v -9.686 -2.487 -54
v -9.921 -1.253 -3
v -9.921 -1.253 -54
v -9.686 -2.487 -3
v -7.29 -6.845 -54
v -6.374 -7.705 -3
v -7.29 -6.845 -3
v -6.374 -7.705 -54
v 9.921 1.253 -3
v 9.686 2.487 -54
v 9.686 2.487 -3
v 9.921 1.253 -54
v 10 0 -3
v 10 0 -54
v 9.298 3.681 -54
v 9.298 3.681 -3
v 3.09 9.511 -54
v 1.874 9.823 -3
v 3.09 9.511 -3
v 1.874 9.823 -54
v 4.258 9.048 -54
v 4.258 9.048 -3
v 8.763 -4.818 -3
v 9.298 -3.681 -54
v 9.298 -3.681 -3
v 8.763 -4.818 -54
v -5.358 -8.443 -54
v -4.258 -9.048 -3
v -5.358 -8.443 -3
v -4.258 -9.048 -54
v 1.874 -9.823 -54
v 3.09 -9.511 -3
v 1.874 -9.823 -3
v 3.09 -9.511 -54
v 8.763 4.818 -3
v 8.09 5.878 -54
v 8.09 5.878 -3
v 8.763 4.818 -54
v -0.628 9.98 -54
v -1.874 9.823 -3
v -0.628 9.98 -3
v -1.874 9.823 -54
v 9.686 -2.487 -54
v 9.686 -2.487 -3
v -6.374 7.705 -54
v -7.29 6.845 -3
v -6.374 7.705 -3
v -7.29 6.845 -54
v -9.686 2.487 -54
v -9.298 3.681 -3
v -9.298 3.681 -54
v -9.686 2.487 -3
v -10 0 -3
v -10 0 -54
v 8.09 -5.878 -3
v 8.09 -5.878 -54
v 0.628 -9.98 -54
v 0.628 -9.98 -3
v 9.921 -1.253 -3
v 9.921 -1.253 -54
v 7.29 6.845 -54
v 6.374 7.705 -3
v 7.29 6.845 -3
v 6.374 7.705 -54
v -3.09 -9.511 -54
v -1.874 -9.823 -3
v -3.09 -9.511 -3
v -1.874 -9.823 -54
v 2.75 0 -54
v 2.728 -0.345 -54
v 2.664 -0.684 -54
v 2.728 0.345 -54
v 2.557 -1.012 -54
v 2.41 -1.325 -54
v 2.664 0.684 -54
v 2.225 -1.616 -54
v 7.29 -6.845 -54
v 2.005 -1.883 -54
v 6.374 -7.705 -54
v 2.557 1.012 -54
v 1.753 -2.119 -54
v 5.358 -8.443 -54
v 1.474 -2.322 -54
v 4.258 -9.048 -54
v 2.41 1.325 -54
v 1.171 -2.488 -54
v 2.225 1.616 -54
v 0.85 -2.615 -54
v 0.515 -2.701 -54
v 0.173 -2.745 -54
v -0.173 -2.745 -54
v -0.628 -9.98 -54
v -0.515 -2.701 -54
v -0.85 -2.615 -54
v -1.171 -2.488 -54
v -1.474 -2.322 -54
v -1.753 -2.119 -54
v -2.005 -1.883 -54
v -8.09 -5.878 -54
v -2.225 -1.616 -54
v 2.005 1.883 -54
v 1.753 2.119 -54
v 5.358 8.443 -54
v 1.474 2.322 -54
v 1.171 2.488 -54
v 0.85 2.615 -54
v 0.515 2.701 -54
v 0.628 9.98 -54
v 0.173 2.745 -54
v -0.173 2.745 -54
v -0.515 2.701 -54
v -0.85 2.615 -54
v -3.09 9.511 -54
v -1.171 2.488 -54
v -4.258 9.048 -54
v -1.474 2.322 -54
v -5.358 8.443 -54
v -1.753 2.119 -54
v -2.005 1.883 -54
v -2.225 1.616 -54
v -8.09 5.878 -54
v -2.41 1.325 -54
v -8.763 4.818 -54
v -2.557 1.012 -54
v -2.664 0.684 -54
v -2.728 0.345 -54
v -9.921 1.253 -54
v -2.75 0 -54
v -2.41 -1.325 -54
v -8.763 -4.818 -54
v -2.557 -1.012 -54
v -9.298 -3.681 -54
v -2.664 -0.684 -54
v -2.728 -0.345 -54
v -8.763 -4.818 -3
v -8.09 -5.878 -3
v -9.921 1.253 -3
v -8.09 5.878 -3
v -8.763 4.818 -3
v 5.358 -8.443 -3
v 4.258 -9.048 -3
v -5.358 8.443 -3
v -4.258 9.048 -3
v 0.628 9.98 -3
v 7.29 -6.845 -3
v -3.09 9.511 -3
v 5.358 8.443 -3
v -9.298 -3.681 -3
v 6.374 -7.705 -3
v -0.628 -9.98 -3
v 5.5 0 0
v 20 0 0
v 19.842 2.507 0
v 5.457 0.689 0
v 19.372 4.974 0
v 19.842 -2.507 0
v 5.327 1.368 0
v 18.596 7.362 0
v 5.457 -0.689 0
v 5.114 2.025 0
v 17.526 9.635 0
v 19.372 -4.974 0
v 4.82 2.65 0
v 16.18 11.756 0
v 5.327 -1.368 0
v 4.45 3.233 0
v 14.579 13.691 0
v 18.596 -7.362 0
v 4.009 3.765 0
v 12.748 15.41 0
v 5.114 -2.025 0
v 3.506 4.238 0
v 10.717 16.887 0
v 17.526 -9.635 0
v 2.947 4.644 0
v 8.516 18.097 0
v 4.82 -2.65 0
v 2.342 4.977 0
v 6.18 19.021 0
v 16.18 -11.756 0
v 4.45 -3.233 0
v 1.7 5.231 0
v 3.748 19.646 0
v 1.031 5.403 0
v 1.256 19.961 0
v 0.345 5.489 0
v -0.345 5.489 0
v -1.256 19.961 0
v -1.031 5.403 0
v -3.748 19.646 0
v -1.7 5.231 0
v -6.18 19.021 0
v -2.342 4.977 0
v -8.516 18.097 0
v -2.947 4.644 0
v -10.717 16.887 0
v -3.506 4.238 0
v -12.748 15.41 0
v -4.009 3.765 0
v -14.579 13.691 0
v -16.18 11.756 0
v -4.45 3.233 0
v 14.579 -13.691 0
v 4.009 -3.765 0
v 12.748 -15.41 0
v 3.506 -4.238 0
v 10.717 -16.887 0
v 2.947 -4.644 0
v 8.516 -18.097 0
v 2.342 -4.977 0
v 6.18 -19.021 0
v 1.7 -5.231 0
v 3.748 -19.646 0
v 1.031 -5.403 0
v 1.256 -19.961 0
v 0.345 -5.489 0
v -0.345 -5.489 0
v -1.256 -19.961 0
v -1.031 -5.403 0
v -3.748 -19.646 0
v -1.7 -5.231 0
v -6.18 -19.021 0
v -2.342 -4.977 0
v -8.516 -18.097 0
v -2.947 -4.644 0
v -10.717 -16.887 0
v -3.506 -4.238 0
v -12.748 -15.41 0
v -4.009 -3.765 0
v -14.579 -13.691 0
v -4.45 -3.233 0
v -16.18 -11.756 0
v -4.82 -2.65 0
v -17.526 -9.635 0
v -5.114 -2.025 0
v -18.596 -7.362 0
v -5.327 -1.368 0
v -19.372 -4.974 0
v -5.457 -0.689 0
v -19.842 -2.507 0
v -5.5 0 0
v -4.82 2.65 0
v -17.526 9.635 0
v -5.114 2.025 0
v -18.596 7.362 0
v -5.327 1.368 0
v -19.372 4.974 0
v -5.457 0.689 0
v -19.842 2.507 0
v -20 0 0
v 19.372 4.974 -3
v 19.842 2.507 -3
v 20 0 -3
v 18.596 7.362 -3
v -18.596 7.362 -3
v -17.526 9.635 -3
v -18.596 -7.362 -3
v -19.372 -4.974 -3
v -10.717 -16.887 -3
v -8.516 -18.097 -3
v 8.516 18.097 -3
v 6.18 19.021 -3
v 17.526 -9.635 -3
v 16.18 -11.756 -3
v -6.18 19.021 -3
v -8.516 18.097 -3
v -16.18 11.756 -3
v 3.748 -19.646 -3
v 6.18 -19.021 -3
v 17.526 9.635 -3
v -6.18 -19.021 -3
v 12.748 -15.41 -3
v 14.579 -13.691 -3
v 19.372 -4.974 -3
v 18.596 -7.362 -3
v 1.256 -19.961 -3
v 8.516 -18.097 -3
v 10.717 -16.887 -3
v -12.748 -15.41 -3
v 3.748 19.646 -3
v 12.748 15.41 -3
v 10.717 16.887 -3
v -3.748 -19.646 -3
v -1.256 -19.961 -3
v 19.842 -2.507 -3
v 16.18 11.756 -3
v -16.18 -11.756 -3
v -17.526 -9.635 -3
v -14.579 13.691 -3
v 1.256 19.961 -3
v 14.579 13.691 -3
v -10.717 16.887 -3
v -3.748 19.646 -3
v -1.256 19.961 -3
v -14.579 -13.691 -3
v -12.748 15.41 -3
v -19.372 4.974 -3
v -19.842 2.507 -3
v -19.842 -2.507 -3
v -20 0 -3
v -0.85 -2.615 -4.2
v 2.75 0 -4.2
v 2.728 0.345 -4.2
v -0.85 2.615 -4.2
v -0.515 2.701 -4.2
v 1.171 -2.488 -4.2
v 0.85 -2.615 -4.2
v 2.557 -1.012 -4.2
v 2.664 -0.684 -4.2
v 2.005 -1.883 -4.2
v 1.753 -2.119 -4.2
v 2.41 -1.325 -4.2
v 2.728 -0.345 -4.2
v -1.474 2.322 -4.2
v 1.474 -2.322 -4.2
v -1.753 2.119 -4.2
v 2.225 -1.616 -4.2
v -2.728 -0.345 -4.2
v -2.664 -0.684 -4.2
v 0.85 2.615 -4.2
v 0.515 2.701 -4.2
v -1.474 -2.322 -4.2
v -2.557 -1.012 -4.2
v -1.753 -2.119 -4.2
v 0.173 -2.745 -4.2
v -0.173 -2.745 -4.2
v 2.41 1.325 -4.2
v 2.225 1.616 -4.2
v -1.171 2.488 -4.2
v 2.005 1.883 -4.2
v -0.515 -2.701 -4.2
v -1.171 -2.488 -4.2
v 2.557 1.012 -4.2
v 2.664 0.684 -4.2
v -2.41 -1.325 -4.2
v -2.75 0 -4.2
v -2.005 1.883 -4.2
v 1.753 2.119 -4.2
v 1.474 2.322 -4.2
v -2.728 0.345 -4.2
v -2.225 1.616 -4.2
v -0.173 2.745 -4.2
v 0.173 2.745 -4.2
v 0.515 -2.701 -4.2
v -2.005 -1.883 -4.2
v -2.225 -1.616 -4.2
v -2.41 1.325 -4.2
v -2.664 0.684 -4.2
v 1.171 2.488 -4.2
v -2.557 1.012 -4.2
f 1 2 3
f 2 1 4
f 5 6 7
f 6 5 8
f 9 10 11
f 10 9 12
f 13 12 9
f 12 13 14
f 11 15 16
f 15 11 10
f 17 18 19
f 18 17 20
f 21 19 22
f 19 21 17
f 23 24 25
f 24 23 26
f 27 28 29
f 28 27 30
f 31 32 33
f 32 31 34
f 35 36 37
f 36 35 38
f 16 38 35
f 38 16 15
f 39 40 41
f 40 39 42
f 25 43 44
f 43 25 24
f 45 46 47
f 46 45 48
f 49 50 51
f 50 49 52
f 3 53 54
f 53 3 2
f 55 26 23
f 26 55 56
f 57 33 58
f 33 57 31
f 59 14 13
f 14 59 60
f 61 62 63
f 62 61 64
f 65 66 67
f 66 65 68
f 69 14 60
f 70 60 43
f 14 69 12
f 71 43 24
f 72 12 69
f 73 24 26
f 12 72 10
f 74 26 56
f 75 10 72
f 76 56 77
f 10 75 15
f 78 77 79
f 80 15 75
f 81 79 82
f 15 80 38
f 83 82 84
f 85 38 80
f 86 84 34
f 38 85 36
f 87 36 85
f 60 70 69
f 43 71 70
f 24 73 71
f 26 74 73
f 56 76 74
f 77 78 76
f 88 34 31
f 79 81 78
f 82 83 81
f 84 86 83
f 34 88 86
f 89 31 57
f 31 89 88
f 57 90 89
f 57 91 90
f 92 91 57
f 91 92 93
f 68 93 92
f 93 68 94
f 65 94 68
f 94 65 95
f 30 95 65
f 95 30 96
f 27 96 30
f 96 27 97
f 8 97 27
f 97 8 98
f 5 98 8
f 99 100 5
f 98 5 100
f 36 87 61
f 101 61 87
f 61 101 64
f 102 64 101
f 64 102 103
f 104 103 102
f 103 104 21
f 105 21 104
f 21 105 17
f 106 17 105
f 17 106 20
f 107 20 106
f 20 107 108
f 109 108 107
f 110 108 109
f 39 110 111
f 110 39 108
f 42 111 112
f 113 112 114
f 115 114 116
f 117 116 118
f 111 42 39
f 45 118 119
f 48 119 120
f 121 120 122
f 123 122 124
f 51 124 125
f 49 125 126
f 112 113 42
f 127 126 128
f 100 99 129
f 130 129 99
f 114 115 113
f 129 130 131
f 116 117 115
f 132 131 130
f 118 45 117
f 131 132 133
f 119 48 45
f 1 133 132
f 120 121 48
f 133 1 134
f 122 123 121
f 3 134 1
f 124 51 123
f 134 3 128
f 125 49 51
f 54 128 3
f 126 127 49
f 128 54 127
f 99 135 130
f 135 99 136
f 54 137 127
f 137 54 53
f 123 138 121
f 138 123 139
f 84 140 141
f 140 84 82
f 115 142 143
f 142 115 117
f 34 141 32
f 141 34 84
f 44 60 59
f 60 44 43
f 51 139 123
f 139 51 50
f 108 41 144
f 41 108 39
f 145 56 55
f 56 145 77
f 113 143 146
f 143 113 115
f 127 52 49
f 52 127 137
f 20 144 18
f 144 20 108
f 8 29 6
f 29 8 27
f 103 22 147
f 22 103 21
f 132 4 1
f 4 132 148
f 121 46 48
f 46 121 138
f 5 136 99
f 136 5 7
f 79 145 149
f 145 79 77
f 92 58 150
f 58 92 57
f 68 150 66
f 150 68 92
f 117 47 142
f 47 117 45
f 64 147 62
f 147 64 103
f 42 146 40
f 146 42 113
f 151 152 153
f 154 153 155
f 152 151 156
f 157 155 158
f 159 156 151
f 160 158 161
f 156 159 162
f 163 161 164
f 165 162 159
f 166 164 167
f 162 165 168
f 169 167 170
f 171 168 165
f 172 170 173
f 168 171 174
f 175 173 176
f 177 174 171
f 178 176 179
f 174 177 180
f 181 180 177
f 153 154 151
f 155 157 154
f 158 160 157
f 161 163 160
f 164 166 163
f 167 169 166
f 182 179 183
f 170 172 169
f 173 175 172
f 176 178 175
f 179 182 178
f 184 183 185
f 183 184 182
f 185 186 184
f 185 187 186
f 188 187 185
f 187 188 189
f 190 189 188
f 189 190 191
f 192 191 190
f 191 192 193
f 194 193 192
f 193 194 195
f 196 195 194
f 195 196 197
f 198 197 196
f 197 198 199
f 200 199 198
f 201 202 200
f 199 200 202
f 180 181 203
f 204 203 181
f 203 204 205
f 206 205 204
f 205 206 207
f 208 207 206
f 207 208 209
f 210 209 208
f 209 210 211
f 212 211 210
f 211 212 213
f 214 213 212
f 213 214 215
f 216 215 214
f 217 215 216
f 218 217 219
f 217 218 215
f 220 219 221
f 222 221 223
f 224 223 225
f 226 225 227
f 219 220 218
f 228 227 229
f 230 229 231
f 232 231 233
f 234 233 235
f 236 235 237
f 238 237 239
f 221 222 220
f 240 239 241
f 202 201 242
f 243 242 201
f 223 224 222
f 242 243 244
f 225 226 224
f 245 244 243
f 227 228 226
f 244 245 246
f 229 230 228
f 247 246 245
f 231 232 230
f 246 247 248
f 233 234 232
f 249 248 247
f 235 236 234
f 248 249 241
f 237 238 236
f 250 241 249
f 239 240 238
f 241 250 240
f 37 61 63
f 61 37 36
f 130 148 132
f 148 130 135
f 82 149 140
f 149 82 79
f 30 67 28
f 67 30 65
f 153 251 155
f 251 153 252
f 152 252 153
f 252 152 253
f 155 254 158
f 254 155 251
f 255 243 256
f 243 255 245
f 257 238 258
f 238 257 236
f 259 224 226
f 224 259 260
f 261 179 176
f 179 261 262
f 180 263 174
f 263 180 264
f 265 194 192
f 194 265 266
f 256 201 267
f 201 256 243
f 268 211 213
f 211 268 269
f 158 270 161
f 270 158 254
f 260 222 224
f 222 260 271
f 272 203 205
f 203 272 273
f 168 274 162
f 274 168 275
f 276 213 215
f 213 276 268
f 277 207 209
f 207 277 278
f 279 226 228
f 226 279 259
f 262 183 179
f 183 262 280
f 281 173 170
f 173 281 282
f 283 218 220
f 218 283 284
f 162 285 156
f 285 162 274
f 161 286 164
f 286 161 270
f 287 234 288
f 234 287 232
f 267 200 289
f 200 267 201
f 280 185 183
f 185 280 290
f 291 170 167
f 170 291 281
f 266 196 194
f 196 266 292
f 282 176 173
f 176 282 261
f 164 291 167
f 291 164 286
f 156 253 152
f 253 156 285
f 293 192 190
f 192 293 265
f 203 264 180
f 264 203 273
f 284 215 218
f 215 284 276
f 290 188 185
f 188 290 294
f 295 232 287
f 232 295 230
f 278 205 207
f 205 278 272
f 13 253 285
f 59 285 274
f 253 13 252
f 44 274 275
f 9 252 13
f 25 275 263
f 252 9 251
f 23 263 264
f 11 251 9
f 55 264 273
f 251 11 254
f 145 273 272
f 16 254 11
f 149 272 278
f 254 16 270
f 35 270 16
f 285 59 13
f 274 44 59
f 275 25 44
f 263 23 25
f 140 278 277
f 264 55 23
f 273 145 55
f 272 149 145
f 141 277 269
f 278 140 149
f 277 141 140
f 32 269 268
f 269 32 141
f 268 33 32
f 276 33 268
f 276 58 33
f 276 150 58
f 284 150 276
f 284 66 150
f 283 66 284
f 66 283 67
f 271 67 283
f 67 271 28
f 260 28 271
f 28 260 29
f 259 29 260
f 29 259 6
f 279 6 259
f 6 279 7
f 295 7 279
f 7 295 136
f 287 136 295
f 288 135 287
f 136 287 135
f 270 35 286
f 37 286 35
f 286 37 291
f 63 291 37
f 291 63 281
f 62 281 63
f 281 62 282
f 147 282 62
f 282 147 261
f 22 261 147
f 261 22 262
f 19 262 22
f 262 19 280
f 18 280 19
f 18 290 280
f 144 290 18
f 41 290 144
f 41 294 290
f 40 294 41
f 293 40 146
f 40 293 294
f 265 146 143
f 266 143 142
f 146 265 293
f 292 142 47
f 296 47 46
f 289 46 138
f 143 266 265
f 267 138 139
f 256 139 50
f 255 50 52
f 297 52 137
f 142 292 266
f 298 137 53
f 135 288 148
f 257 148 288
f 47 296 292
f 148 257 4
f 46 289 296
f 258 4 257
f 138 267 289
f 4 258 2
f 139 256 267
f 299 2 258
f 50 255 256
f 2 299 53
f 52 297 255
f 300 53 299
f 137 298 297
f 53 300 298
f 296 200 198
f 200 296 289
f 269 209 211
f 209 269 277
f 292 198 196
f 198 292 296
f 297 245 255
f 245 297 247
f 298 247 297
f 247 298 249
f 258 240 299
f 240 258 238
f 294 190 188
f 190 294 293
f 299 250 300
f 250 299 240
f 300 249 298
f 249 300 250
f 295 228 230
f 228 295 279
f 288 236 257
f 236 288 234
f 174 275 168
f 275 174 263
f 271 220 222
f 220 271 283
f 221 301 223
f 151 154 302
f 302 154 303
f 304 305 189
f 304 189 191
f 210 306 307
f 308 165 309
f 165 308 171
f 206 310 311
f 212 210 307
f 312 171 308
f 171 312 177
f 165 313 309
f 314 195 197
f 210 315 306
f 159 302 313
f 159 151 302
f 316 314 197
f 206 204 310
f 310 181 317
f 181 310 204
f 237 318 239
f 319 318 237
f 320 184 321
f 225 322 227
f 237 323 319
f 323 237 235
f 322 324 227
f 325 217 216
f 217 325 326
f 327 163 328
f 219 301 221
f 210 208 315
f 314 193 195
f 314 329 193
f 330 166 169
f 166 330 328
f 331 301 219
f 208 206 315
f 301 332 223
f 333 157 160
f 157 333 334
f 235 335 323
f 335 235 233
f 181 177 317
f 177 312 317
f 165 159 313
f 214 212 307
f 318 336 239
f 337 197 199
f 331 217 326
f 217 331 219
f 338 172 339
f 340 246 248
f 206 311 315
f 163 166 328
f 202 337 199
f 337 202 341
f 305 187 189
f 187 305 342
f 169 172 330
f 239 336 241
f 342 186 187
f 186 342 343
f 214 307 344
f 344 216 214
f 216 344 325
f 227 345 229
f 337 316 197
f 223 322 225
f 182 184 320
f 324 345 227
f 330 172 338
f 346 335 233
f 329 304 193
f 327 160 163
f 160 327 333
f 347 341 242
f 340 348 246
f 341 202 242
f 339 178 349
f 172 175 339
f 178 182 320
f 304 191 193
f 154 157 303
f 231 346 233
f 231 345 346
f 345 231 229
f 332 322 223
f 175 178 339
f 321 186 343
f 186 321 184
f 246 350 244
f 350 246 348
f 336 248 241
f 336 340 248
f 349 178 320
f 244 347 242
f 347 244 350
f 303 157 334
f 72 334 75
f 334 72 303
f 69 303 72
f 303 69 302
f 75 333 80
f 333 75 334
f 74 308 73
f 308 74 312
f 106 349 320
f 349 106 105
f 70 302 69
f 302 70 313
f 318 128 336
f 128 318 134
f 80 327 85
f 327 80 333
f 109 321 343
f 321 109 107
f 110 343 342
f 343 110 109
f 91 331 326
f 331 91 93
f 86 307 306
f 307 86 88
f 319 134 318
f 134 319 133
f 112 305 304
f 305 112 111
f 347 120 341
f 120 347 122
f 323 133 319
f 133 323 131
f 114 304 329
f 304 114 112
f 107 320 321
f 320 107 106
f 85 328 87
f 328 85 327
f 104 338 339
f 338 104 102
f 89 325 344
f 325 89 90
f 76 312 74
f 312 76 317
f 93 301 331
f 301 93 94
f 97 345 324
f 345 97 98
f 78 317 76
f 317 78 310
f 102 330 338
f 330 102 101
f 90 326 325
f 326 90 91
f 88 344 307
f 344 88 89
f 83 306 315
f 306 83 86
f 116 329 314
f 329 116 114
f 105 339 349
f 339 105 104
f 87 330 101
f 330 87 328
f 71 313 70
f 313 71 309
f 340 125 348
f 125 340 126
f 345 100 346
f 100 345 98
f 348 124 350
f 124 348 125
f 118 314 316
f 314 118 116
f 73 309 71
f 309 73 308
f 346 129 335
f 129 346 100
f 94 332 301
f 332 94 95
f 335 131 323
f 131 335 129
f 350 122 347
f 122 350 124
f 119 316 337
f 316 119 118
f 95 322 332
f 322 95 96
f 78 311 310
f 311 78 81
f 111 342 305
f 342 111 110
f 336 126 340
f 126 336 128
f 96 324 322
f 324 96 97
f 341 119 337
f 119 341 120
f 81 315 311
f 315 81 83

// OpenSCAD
$fn = 50;


difference() {
	union() {
		translate(v = [0, 0, -54.0000000000]) {
			cylinder(h = 54, r = 10.0000000000);
		}
		translate(v = [0, 0, -3.0000000000]) {
			cylinder(h = 3, r = 20.0000000000);
		}
	}
	union() {
		translate(v = [0, 0, 0]) {
			rotate(a = [0, 0, 0]) {
				difference() {
					union() {
						#translate(v = [0, 0, -54.0000000000]) {
							cylinder(h = 54, r = 2.2500000000);
						}
						#translate(v = [0, 0, -4.2000000000]) {
							cylinder(h = 4.2000000000, r = 10.0000000000, r1 = 2.7500000000, r2 = 5.5000000000);
						}
						#translate(v = [0, 0, -54.0000000000]) {
							cylinder(h = 54, r = 2.7500000000);
						}
						#translate(v = [0, 0, -54.0000000000]) {
							cylinder(h = 54, r = 2.2500000000);
						}
					}
					union();
				}
			}
		}
	}
}
